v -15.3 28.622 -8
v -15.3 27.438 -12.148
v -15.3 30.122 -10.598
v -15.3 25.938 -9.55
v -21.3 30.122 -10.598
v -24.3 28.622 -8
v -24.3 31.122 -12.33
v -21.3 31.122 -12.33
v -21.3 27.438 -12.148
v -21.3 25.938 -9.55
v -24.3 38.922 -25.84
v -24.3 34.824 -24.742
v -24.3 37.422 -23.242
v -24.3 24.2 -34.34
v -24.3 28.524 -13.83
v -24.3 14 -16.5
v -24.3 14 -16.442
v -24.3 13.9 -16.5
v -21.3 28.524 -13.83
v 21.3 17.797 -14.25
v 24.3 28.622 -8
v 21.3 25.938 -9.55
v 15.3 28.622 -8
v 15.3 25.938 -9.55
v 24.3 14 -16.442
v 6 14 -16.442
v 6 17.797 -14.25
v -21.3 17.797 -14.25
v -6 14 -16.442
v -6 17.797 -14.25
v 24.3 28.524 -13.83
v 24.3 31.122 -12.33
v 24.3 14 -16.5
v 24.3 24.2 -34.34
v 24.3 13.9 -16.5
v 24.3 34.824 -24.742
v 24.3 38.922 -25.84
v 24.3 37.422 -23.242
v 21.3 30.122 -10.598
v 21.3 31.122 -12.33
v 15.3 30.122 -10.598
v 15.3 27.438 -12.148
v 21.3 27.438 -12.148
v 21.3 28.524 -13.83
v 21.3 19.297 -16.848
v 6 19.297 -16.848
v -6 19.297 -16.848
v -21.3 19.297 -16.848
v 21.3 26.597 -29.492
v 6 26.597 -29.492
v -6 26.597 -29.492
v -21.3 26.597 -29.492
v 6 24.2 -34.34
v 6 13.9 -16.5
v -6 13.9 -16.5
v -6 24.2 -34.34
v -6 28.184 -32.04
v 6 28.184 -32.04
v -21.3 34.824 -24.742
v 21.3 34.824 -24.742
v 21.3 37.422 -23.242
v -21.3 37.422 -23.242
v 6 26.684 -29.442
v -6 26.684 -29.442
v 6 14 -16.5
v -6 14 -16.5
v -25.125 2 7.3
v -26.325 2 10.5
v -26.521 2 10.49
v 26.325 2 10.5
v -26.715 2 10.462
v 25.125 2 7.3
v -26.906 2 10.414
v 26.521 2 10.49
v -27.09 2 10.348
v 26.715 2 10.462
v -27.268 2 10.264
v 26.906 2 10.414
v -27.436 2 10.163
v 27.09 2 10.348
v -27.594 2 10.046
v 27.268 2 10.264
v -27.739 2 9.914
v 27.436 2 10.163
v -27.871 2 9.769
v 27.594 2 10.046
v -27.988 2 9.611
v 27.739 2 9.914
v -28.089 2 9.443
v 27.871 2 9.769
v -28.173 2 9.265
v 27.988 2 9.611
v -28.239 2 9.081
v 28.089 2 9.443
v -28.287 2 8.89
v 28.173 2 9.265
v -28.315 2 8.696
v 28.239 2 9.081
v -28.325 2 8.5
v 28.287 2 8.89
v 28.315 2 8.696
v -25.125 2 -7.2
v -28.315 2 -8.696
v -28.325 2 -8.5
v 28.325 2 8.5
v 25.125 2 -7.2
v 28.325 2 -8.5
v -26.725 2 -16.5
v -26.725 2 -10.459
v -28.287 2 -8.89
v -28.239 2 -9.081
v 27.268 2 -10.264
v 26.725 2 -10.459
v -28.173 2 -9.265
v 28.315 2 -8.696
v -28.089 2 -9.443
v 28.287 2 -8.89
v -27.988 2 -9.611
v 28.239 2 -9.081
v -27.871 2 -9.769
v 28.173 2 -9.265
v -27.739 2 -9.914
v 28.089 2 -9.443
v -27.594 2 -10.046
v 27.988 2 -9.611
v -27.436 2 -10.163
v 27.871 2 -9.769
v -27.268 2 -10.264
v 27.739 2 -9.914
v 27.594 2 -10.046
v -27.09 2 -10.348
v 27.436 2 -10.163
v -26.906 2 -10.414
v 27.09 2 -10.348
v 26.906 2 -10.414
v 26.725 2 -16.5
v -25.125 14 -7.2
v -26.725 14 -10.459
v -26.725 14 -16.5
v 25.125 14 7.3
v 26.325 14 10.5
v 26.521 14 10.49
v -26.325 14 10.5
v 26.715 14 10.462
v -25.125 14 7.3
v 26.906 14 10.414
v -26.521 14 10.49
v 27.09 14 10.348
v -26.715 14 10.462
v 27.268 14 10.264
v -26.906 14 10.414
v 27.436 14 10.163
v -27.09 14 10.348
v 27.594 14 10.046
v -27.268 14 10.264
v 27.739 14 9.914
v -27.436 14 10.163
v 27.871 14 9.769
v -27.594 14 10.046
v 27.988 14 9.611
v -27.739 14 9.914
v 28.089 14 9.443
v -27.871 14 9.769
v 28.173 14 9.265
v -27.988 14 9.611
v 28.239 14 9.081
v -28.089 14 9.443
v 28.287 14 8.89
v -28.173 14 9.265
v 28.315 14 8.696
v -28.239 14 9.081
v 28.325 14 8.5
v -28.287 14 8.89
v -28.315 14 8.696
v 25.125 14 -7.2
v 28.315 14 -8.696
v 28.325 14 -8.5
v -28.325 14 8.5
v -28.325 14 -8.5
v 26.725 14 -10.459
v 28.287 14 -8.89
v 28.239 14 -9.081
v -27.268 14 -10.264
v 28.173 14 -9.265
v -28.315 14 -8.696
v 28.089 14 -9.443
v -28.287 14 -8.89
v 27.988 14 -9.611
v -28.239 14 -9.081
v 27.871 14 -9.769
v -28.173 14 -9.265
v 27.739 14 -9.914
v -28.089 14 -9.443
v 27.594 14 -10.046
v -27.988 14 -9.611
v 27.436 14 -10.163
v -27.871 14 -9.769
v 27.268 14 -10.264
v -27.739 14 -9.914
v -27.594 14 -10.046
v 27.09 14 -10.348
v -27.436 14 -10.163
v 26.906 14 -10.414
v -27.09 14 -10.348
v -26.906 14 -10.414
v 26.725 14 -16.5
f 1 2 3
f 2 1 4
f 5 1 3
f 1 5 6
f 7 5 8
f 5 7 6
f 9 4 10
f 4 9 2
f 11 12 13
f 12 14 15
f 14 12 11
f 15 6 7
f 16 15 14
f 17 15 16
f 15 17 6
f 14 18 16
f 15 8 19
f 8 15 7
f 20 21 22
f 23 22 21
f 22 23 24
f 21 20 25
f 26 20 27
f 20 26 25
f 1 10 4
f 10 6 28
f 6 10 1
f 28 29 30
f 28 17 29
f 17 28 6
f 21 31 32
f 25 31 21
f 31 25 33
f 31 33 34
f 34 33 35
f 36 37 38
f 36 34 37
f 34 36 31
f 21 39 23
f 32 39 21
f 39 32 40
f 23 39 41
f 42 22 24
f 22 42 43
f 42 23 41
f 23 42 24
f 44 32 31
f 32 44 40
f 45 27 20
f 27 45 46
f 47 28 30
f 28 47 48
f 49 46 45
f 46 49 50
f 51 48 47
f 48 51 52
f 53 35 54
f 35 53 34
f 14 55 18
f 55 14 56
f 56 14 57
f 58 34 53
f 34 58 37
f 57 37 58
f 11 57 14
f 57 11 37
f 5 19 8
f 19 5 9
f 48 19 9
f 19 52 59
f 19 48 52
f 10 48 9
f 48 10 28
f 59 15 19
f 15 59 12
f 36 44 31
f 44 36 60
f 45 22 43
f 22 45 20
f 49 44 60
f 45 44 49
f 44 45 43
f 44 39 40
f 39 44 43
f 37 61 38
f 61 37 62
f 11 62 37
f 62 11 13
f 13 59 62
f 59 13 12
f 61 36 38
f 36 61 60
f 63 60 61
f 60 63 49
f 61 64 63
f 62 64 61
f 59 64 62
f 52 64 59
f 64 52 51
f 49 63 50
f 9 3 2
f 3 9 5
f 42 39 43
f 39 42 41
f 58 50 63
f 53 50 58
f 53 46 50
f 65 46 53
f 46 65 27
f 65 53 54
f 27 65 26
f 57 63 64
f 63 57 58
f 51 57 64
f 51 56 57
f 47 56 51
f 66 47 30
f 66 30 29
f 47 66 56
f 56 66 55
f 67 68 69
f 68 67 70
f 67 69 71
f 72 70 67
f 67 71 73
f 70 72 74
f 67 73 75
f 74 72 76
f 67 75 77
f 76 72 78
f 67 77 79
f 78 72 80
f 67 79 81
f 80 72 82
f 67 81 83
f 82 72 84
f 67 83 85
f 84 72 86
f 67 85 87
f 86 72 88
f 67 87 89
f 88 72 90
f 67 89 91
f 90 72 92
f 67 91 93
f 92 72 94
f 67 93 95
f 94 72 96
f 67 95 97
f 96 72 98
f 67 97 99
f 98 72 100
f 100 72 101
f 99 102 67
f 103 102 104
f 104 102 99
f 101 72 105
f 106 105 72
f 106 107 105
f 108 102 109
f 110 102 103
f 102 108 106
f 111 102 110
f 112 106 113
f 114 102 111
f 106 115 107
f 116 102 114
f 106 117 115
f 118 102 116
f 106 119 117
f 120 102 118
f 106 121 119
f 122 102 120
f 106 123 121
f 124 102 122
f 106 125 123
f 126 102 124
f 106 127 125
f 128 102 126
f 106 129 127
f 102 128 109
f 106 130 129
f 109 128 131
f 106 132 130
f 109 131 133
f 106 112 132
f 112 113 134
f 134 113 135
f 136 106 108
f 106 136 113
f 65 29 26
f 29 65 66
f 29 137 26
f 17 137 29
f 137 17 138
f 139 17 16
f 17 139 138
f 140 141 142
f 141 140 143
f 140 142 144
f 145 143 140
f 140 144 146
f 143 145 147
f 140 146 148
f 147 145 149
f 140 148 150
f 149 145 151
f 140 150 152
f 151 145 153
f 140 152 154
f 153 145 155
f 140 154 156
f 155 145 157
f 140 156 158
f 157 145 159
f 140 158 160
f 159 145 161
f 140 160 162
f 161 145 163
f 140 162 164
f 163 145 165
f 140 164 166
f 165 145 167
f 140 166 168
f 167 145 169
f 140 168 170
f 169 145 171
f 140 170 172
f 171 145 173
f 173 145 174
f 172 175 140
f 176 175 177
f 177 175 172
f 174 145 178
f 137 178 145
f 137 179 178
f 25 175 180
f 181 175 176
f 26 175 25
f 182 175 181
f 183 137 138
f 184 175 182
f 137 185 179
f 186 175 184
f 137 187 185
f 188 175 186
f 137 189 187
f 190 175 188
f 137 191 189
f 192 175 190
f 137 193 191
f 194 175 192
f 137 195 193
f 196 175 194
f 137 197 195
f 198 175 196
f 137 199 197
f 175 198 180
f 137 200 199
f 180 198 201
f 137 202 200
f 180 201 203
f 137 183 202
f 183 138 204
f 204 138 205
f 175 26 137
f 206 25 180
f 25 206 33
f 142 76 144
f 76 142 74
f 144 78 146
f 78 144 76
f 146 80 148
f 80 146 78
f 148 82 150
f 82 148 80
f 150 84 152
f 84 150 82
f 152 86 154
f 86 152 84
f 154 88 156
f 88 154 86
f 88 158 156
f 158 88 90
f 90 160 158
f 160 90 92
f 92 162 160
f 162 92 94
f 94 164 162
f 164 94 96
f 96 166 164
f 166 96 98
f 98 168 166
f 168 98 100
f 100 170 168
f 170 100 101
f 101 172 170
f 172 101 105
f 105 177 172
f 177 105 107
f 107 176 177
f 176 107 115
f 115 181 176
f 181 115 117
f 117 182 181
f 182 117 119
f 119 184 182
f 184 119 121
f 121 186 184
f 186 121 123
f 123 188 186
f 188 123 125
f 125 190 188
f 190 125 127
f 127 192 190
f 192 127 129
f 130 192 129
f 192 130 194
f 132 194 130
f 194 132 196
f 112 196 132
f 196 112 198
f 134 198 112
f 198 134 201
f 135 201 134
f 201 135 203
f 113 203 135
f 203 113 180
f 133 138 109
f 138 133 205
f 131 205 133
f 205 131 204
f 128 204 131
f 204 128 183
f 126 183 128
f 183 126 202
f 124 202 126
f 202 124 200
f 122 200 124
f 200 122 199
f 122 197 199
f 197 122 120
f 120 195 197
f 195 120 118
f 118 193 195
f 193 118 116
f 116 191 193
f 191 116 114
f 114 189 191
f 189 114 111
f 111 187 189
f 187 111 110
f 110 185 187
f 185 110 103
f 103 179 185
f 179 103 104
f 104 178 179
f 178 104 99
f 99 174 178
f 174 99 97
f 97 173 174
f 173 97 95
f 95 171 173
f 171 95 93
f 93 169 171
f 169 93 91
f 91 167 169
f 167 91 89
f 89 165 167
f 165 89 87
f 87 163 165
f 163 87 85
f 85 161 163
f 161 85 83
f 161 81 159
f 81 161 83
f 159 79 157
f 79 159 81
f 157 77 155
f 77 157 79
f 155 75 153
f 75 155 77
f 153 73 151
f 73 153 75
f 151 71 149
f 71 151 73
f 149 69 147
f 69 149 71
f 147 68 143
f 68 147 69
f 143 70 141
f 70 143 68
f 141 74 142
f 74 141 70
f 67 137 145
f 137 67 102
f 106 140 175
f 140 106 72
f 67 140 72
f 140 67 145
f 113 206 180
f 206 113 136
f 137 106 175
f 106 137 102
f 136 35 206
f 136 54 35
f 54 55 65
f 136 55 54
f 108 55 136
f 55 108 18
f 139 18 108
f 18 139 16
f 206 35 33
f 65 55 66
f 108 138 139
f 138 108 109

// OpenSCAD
// file: thermal_cam_mount_common.scad
// thermal_cam_mount_common.scad — clamp a Sipeed T256s thermal camera onto the
// LED-56S ring light's control-box tab, for the benchhud thermal-fusion HUD.
//
// WHY THIS MOUNT EXISTS: the T256s is registered onto the scope's visible feed
// so a hot component's bloom labels that component. Registration is computed
// once and must HOLD every session — so the mount has to be rigid, non-drifting,
// and fixed-angle. Wobble = re-calibrate every sit-down. This is the physical
// half of the registration problem.
//
// ── ONE PLACEHOLDER LEFT ──────────────────────────────────────────────────
//   TAB_T (tab front-to-back thickness) is NOT yet measured. Everything else is
//   off calipers or the mounted-in-place photos. Set TAB_T and re-render; that
//   is the single change between this skeleton and a printable clamp.
// ──────────────────────────────────────────────────────────────────────────
//
// FRAME: tab extends +Y radially out from the ring (ring at -Y). Tab cross-
// section is X (width) × Z (thickness). Diffuser/top face at +Z, board-facing
// bottom at -Z. The cam hangs below (-Z) with its screen toward +Y (the user)
// and its USB-C cable exiting straight down (female/bottom port — confirmed by
// the mounted photos).

$fn = 64;
EPS = 0.1;   // union overlap / cut overrun so booleans stay manifold

// ---- LED-56S control-box tab (MEASURED except TAB_T) ----
TAB_W   = 49.65;   // measured across the tab
TAB_T   = 14.0;    // ⚠ PLACEHOLDER — front-to-back thickness. MEASURE + replace.
TAB_CLR = 0.6;     // clamp bore clearance around the tab

// The rocker switch is ~18 mm from the tab's outer end (front face); the 12 V
// barrel jack is on one side. The band grips near the ring ROOT, clear of both.
// It must grip the rigid ABS control-box, NOT the frosted diffuser lip.
BAND_Y0    = 2;    // start of the band, out from the ring root
BAND_DEPTH = 12;   // radial length of tab the band grips
BAND_WALL  = 3.2;
PINCH_D    = 3.4;  // M3 pinch bolt — split sleeve tightens rather than sliding
PINCH_AF   = 5.6;  // over the switch

// ---- Sipeed T256s (LOCKED) ----
CAM_W = 42; CAM_H = 35; CAM_D = 14;   // horizontal × vertical × depth (body)
CAM_CLR   = 0.6;
CAM_ANGLE = 30;    // tilt from vertical → thermal lens looks roughly down at the board

// ---- open cradle (grip edges/corners; alu body is the heatsink; screen visible) ----
LIP     = 4.5;     // bottom-edge catch that the cam sits into
SIDE_H  = 14;      // how far side walls rise up the 35 mm cam height
CORNER  = 6;       // top-corner inturned catches
CABLE_W = 12;      // bottom cable slot (USB-C exits down)
WALL    = 3;

// ---- arm ----
ARM_DROP = 6;      // short — the cam sits just below the tab

// ============================================================================

// Clamp sleeve around the tab cross-section. SKELETON: a plain closed sleeve to
// show the concept. The finished part becomes a split sleeve with an M3 pinch
// bolt so it clips on radially rather than sliding over the switch — that split
// is placed once a straight-on shot of the tab underside pins the switch/jack
// footprint. (PINCH_D / PINCH_AF are reserved for it.)
module _tab_clamp() {
    bw = TAB_W + TAB_CLR; bt = TAB_T + TAB_CLR;
    ow = bw + 2*BAND_WALL; ot = bt + 2*BAND_WALL;
    translate([0, BAND_Y0, 0]) rotate([-90,0,0])
        linear_extrude(BAND_DEPTH) difference() {
            offset(2) offset(-2) square([ow, ot], center=true);   // rounded outer
            square([bw, bt], center=true);                         // tab bore
        }
}

// Open cradle in its own upright frame (before the downward tilt): a back plate
// (behind the screen) + bottom lip + two side walls + top-front corner catches.
// Grips bottom edge, both sides, and the top corners; the lens face (front) and
// most of the screen (back) stay open, and the alu body heatsinks freely.
module _cradle() {
    iw = CAM_W + CAM_CLR; id = CAM_D + CAM_CLR;
    ow = iw + 2*WALL; oy = id + 2*WALL;
    difference() {
        union() {
            // bottom tray
            translate([-ow/2, 0, 0]) cube([ow, oy, LIP]);
            // two side walls (overlap the tray in z)
            translate([-ow/2, 0, 0]) cube([WALL, oy, SIDE_H]);
            translate([ iw/2, 0, 0]) cube([WALL, oy, SIDE_H]);
            // back plate behind the screen (overlaps both side walls in y)
            translate([-ow/2, oy - WALL, 0]) cube([ow, WALL, SIDE_H + WALL]);
            // top-front corner catches — sit on top of the side walls (overlap in x+z)
            for (sx = [-ow/2, iw/2 - CORNER]) translate([sx, 0, SIDE_H - EPS]) cube([WALL + CORNER, WALL + 2, WALL + EPS]);
        }
        // cam body cavity (overruns top so the cam drops in)
        translate([-iw/2, WALL, LIP]) cube([iw, id, CAM_H + CAM_CLR + 10]);
        // bottom cable slot (USB-C exits straight down)
        translate([-CABLE_W/2, -EPS, -EPS]) cube([CABLE_W, oy + 2*EPS, LIP + 2*EPS]);
    }
}

module thermal_cam_mount() {
    bt = TAB_T + TAB_CLR;
    ow = TAB_W + TAB_CLR + 2*BAND_WALL;
    clamp_bottom = -bt/2 - BAND_WALL;           // -Z underside of the band
    yc = BAND_Y0 + BAND_DEPTH/2;                // band mid-length
    union() {
        _tab_clamp();
        // arm: a solid block bridging from inside the band's underside down to
        // the cradle. Inset from the clamp's outer width so their side faces
        // don't coincide (coplanar faces = non-manifold), and tall enough to
        // overlap the sleeve's bottom wall in volume so the union is one body.
        aw = ow - BAND_WALL;
        translate([-aw/2, BAND_Y0, clamp_bottom - ARM_DROP])
            cube([aw, BAND_DEPTH, ARM_DROP + BAND_WALL + EPS]);
        // cradle, tilted so the lens aims down-and-out toward the board
        translate([0, yc + BAND_DEPTH/2 - EPS, clamp_bottom - ARM_DROP])
            rotate([-(90 - CAM_ANGLE), 0, 0]) _cradle();
    }
}

// leaf part files call thermal_cam_mount(); this common defines only.
// main file
// thermal_cam_mount — one-piece clamp + arm + open cradle. Print clamp-down.
// SKELETON: TAB_T is a placeholder until the tab thickness is measured.
include <thermal_cam_mount_common.scad>
thermal_cam_mount();
